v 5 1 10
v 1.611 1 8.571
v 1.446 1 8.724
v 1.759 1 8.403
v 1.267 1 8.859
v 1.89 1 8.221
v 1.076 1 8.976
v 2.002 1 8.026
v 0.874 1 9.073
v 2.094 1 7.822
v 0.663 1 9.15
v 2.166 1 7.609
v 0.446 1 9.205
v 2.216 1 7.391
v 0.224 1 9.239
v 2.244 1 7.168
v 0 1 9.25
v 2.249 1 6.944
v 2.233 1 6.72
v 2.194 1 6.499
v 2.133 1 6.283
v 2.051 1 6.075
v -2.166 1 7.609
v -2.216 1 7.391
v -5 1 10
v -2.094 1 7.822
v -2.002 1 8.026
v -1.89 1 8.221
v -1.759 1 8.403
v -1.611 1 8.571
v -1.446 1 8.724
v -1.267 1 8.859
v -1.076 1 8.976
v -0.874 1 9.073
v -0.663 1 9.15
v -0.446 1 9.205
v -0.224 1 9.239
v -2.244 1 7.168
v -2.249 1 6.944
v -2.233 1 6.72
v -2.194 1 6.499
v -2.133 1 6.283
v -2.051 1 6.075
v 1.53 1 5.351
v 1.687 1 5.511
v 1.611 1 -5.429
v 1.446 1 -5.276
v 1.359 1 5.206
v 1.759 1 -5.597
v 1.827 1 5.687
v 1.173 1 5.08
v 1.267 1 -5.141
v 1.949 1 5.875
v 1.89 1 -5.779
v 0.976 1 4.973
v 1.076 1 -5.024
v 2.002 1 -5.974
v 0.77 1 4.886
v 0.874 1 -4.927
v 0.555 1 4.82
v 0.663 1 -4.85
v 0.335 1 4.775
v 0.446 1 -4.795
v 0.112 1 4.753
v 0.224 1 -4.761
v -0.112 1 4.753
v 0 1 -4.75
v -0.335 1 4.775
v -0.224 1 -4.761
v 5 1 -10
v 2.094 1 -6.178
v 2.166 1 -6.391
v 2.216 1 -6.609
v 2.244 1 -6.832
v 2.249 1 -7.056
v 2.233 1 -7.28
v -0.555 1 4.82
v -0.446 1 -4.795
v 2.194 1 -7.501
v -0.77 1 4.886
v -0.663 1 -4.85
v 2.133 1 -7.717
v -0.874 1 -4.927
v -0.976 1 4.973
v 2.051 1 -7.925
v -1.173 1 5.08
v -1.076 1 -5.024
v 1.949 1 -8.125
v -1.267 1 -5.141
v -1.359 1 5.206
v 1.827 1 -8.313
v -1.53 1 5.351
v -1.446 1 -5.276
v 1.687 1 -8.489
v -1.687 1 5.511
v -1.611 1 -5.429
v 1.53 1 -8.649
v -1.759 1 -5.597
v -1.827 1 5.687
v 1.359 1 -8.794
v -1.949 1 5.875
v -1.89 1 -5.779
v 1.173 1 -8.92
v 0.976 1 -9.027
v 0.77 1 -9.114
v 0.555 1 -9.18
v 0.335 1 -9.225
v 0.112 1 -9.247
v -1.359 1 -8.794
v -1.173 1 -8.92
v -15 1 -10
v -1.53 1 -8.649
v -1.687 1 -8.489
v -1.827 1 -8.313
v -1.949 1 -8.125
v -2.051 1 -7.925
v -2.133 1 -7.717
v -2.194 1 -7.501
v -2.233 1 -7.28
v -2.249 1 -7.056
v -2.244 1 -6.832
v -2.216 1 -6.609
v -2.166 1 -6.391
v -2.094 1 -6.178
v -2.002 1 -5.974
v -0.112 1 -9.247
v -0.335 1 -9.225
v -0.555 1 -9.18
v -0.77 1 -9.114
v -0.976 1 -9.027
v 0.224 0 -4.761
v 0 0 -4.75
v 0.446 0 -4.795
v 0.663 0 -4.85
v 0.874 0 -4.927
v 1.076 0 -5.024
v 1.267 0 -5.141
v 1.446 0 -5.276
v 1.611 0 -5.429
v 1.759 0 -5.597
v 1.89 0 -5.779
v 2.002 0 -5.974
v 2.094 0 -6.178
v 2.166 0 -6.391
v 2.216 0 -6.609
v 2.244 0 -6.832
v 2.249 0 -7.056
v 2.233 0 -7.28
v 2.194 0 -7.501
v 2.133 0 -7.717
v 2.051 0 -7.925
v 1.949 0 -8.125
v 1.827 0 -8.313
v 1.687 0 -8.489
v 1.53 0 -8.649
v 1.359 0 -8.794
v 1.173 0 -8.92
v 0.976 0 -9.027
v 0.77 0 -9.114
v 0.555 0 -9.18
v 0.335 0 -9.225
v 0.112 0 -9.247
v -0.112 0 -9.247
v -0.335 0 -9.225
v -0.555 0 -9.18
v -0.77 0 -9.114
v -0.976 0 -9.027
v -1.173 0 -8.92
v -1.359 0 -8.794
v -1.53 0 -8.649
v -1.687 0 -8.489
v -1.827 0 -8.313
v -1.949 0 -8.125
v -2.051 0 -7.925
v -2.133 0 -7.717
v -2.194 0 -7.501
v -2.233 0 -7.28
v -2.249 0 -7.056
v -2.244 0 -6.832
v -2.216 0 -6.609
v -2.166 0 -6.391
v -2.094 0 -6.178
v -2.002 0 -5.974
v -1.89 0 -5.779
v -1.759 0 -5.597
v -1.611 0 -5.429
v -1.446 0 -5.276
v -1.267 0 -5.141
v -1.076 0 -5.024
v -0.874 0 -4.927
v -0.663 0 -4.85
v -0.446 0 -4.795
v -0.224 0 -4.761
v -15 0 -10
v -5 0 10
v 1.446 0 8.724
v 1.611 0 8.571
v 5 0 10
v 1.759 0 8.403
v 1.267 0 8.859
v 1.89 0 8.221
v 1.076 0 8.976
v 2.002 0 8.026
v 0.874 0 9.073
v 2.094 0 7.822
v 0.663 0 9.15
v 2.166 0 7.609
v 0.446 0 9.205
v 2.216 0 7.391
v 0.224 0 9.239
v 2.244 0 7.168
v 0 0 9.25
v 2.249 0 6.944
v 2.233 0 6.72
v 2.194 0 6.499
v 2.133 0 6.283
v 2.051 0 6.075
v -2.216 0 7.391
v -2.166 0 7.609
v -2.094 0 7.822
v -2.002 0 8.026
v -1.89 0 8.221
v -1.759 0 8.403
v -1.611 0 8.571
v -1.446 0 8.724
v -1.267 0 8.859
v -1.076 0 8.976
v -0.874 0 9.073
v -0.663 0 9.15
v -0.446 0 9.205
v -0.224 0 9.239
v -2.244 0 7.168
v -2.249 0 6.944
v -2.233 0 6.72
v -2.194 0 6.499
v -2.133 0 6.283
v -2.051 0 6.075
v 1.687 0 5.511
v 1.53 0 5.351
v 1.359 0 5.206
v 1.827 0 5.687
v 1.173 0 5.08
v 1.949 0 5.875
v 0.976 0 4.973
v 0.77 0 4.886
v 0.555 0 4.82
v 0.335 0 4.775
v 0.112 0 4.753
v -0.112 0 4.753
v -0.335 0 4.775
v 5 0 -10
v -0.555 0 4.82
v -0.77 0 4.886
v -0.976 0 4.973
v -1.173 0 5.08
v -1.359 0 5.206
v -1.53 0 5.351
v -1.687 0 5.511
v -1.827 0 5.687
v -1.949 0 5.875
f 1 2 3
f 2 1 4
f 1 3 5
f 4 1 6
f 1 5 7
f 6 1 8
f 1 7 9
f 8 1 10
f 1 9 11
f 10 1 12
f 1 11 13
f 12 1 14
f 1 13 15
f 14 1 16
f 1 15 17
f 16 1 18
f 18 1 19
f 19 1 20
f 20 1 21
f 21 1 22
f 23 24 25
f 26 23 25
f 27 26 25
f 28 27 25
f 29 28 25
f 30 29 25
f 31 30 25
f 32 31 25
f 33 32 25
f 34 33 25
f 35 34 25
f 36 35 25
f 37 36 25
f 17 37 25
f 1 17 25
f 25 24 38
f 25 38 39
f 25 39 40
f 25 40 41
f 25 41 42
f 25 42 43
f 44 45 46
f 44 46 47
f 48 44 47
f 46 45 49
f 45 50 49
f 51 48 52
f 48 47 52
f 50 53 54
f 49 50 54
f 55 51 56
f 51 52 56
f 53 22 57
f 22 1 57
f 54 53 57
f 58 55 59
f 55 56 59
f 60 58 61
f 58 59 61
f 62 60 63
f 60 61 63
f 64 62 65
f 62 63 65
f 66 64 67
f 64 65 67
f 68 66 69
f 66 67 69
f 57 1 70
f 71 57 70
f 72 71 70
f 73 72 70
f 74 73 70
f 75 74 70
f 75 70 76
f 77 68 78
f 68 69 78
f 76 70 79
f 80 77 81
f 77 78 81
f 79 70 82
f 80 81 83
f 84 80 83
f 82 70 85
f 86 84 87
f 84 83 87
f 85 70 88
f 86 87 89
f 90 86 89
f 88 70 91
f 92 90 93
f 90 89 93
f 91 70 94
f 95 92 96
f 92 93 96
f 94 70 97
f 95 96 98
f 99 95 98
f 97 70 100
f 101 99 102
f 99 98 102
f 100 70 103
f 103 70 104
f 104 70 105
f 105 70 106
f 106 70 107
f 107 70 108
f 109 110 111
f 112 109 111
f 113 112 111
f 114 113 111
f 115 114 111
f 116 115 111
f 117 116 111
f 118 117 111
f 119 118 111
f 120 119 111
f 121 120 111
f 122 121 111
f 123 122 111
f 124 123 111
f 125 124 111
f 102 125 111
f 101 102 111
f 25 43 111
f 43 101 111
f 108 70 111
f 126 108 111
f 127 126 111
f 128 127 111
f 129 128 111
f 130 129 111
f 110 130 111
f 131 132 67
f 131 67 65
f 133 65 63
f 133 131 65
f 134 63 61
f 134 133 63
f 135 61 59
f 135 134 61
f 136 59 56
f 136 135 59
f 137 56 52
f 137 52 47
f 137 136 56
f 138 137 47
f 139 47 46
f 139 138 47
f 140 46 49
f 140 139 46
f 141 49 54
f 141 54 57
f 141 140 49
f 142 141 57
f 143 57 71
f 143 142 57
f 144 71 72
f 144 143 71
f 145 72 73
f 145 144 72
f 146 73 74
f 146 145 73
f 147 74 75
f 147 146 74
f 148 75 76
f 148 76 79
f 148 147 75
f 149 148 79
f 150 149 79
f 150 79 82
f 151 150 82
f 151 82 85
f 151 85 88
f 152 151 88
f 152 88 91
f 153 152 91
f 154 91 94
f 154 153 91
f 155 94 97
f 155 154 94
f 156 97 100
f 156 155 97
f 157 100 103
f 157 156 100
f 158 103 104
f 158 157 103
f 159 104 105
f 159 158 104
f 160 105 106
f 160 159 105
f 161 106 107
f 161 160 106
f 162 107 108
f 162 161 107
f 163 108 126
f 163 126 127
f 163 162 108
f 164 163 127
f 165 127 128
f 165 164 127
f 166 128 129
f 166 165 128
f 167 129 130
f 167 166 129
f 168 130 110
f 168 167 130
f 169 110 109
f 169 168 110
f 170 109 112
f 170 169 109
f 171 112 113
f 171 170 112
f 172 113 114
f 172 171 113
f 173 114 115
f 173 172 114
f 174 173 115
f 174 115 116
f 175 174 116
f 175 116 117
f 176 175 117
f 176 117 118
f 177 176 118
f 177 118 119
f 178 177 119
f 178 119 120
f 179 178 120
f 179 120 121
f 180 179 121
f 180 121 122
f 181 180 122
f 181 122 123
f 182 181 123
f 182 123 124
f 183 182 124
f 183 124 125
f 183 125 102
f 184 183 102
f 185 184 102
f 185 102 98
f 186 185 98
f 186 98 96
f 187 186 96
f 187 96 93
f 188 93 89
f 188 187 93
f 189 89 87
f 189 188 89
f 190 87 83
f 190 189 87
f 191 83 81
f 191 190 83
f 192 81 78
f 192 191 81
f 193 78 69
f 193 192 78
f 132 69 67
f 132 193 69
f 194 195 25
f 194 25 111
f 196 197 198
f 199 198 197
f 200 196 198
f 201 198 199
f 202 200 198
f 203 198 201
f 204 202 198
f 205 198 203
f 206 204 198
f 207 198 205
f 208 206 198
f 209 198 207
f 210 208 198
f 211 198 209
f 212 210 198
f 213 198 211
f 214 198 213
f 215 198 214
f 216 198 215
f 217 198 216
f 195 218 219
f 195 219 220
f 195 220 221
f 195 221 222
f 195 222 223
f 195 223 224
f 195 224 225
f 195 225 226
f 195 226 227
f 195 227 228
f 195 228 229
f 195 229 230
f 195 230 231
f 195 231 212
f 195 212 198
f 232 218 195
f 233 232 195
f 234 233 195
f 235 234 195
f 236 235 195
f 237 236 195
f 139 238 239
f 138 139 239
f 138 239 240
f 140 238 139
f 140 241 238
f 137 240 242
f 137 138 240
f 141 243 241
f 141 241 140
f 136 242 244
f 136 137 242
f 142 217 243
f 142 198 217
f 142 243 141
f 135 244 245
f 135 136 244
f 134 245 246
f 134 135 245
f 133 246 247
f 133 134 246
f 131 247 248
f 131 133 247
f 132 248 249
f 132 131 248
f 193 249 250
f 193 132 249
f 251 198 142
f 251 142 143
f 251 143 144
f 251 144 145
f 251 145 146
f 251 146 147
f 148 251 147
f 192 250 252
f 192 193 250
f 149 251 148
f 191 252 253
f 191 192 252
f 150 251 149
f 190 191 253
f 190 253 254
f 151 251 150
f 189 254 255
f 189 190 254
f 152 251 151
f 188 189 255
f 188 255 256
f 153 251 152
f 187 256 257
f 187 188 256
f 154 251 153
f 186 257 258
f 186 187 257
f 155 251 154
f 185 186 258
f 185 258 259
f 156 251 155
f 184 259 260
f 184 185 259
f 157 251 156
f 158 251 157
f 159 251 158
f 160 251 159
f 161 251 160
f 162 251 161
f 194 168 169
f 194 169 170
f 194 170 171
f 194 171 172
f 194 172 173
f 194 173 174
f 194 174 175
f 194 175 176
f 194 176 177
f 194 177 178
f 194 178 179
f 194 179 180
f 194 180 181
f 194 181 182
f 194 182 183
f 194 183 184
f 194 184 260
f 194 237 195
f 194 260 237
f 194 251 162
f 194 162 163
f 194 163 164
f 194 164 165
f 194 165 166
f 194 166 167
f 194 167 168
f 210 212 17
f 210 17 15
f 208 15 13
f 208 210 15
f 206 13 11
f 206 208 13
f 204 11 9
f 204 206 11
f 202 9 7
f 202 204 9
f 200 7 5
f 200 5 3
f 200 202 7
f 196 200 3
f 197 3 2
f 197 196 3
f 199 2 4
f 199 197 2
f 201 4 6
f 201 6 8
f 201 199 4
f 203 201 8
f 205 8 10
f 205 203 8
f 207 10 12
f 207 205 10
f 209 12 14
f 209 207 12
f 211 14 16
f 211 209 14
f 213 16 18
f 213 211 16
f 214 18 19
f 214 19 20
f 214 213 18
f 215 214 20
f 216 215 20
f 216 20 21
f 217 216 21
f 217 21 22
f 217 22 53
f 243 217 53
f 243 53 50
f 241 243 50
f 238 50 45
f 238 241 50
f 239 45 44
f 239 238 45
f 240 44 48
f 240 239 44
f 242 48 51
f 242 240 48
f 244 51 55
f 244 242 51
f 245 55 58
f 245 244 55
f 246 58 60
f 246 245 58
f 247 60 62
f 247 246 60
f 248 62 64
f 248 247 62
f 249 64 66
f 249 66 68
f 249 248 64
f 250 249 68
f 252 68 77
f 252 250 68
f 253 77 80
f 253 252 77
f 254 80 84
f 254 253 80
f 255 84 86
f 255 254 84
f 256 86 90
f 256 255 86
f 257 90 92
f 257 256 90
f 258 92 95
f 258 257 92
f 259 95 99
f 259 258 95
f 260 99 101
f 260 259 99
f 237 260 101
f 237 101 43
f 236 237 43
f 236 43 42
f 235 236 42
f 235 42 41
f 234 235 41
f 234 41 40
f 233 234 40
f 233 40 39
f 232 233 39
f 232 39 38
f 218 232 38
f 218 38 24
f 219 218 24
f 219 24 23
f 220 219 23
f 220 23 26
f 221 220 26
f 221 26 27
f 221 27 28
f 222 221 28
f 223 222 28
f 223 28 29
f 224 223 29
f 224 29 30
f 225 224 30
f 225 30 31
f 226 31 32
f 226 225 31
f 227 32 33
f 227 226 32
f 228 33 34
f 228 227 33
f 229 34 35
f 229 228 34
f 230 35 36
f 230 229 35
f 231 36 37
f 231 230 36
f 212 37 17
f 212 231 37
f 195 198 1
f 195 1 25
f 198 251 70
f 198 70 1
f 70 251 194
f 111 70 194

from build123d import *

# Parameters (mm, degrees)
SKETCH1_R           = 2.25
BOSS_EXTRUDE1_DEPTH = 1


with BuildPart() as part:
    # Sketch1 → Boss-Extrude1 (new body)
    with BuildSketch(Plane(origin=(0, 0, 0), x_dir=(1, 0, 0), z_dir=(0, 1, 0))):
        Polygon((-5, -10), (-15, 10), (-5, 10), (5, 10), (5, -10), align=None)
        with Locations(Location((0, 7, 0), (0, 0, 270))):
            Circle(SKETCH1_R, mode=Mode.SUBTRACT)
        with Locations(Location((0, -7, 0), (0, 0, 270))):
            Circle(SKETCH1_R, mode=Mode.SUBTRACT)
    extrude(amount=BOSS_EXTRUDE1_DEPTH)


solid = part.part
